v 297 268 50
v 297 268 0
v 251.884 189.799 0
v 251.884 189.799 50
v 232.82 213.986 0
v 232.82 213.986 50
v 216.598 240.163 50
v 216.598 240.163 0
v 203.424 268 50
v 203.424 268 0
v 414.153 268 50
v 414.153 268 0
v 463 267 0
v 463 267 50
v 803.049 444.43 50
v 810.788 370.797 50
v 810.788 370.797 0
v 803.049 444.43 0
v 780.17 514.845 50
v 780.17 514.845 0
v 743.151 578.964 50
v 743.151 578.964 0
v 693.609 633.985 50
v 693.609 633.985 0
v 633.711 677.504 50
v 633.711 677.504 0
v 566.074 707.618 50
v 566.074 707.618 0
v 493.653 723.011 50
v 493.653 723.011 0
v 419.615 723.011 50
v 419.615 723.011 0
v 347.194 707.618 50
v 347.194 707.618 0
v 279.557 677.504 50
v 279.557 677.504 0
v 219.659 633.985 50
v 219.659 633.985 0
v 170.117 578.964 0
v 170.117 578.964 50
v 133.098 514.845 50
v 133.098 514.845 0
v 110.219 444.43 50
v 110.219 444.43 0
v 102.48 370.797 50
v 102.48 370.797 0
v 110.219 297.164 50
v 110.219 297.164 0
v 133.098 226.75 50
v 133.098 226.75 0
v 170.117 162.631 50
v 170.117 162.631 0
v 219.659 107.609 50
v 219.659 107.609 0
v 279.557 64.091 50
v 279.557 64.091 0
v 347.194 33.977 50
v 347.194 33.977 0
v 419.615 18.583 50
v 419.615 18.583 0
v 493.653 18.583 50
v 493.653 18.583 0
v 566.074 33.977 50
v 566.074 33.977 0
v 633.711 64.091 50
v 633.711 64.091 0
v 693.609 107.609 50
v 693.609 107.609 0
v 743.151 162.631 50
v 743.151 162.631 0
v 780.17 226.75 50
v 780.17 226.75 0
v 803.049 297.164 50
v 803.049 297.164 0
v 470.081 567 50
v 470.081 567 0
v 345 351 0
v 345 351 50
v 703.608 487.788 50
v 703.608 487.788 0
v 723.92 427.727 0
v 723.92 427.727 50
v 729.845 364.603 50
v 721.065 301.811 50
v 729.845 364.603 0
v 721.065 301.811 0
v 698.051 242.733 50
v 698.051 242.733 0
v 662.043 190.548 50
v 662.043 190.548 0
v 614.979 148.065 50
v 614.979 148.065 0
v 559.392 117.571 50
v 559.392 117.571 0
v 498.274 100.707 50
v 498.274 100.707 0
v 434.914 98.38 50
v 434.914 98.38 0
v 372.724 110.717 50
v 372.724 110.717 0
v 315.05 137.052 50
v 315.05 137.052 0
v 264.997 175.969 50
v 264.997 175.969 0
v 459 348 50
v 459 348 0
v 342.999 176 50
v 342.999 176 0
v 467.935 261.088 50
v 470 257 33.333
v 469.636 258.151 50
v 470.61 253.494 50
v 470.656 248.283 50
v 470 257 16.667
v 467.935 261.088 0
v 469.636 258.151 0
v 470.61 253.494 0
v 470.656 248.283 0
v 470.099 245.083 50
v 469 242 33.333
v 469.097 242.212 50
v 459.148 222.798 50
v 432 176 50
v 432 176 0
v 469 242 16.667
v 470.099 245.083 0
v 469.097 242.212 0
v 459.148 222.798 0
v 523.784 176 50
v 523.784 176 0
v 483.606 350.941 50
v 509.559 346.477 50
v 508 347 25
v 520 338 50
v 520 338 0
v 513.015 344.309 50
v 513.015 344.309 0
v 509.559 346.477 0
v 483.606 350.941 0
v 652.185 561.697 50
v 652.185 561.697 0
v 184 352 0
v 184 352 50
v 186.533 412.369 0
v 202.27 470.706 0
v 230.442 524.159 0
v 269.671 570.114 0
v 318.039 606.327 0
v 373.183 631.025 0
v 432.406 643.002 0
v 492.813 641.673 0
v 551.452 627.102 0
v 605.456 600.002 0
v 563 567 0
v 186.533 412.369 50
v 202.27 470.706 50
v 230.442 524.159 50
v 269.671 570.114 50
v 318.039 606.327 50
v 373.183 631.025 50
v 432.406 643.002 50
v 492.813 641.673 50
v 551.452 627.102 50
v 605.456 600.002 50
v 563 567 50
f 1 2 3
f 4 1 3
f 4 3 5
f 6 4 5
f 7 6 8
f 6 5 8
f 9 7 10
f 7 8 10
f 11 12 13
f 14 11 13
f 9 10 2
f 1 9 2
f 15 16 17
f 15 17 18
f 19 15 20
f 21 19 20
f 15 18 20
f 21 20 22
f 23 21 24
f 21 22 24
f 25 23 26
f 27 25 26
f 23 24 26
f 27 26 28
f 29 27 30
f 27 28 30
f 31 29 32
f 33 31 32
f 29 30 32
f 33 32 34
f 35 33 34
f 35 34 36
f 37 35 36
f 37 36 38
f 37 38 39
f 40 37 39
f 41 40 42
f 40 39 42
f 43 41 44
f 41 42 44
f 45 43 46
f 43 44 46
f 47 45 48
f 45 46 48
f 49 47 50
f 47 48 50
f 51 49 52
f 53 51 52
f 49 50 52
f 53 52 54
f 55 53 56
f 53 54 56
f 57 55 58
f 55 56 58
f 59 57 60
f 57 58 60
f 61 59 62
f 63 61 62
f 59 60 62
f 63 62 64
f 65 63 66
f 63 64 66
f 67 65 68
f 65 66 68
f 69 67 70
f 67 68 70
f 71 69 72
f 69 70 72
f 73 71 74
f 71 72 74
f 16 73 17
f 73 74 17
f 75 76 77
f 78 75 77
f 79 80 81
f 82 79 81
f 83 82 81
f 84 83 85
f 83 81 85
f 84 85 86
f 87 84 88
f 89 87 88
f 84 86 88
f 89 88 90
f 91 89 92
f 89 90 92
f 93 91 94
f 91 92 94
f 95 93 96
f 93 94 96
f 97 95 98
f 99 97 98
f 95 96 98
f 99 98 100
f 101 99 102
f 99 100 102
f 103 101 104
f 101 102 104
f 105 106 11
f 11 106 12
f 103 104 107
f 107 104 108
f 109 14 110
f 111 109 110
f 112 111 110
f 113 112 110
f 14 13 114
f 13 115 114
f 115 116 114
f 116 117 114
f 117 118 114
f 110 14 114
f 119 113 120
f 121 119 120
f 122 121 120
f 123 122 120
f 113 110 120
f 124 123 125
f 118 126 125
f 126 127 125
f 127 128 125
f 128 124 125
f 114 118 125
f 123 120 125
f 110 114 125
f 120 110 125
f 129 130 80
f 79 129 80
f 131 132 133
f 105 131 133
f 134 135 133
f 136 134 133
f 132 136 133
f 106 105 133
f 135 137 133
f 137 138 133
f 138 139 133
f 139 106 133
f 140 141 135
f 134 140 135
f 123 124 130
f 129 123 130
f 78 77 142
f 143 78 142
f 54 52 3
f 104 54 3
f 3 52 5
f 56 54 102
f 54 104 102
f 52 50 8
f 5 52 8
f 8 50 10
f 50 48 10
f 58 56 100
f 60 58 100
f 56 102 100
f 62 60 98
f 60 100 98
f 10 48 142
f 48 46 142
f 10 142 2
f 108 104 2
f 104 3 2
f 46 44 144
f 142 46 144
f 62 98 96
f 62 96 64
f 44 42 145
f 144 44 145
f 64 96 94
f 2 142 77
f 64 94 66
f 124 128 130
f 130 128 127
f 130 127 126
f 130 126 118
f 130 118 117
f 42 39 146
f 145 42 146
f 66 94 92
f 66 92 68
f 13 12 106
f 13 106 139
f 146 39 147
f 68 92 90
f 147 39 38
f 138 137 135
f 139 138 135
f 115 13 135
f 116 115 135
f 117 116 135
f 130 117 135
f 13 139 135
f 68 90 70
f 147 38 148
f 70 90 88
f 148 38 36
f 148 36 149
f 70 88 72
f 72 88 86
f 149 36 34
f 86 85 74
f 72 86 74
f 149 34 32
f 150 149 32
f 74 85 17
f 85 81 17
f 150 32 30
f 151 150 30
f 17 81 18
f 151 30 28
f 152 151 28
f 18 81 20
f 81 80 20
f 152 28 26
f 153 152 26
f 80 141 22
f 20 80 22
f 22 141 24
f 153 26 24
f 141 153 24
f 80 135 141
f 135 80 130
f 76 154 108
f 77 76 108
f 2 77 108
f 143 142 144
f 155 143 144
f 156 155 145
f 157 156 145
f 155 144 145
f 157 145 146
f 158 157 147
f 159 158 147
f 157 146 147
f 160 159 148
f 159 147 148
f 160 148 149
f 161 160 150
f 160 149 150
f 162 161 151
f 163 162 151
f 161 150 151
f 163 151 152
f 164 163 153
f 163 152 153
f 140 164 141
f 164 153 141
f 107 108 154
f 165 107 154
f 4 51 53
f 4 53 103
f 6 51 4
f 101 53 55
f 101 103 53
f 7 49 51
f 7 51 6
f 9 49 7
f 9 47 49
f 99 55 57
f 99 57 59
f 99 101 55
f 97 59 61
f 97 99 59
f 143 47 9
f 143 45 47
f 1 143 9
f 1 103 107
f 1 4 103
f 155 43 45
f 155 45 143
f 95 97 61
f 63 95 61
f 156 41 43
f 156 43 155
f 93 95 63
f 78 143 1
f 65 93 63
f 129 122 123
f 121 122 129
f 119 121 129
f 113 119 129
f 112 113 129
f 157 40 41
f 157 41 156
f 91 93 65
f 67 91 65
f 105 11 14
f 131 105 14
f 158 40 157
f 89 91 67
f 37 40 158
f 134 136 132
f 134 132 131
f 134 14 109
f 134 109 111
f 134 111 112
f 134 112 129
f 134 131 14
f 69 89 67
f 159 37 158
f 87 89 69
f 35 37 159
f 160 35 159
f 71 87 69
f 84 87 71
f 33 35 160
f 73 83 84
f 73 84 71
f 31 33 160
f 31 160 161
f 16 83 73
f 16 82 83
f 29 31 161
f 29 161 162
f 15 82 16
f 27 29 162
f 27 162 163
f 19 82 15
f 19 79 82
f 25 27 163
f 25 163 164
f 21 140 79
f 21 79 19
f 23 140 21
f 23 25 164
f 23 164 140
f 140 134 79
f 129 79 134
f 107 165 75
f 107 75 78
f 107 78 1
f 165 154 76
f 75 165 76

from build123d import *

# Parameters (mm, degrees)
SKETCH1_R           = 354.154198638
BOSS_EXTRUDE4_DEPTH = 50


with BuildPart() as part:
    # Sketch1 → Boss-Extrude4 (new body)
    with BuildSketch(Plane.XY):
        with Locations((456.634031844, 370.797239723)):
            Circle(SKETCH1_R)
        with BuildLine():
            Line((652.184505988, 561.696856288), (520, 338))
            add(Edge.make_bspline(
                [(520, 338), (516, 341), (512.856486558, 345.810656353), (508, 347), (483.294181497, 353.050404531), (477.851743634, 351.141957272), (459, 348)],
                knots=[0, 0, 0, 0, 1, 1, 1, 2, 2, 2, 2], degree=3))
            Line((459, 348), (414.15311107, 268.000000001))
            Line((414.15311107, 268.000000001), (463, 267))
            add(Edge.make_bspline(
                [(463, 267), (465.333333333, 263.666666667), (469.050440025, 260.956499894), (470, 257), (471.16945492, 252.127271165), (471.128314939, 246.536671316), (469, 242), (458.288028235, 219.166586501), (444.333333333, 198), (432, 176)],
                knots=[0, 0, 0, 0, 1, 1, 1, 2, 2, 2, 3, 3, 3, 3], degree=3))
            Line((432, 176), (523.783724069, 176))
            Line((523.783724069, 176), (703.607534398, 487.787583679))
            ThreePointArc((703.607534398, 487.787583679), (614.979125151, 148.065376335), (264.996930573, 175.96943637))
            Line((264.996930573, 175.96943637), (342.999405137, 176))
            Line((342.999405137, 176), (562.999999995, 567.000000012))
            Line((562.999999995, 567.000000012), (470.080751257, 567.000000012))
            Line((470.080751257, 567.000000012), (344.999999995, 351.000000012))
            Line((344.999999995, 351.000000012), (183.999999995, 352.000000012))
            ThreePointArc((183.999999995, 352.000000012), (344.926101955, 620.204516968), (652.184505988, 561.696856288))
        make_face(mode=Mode.SUBTRACT)
        with BuildLine():
            Line((203.423883848, 268.000000001), (297, 268.000000001))
            Line((297, 268.000000001), (251.884299831, 189.799453042))
            ThreePointArc((251.884299831, 189.799453042), (224.339726467, 226.845833922), (203.423883848, 268.000000001))
        make_face(mode=Mode.SUBTRACT)
    extrude(amount=BOSS_EXTRUDE4_DEPTH)


solid = part.part
